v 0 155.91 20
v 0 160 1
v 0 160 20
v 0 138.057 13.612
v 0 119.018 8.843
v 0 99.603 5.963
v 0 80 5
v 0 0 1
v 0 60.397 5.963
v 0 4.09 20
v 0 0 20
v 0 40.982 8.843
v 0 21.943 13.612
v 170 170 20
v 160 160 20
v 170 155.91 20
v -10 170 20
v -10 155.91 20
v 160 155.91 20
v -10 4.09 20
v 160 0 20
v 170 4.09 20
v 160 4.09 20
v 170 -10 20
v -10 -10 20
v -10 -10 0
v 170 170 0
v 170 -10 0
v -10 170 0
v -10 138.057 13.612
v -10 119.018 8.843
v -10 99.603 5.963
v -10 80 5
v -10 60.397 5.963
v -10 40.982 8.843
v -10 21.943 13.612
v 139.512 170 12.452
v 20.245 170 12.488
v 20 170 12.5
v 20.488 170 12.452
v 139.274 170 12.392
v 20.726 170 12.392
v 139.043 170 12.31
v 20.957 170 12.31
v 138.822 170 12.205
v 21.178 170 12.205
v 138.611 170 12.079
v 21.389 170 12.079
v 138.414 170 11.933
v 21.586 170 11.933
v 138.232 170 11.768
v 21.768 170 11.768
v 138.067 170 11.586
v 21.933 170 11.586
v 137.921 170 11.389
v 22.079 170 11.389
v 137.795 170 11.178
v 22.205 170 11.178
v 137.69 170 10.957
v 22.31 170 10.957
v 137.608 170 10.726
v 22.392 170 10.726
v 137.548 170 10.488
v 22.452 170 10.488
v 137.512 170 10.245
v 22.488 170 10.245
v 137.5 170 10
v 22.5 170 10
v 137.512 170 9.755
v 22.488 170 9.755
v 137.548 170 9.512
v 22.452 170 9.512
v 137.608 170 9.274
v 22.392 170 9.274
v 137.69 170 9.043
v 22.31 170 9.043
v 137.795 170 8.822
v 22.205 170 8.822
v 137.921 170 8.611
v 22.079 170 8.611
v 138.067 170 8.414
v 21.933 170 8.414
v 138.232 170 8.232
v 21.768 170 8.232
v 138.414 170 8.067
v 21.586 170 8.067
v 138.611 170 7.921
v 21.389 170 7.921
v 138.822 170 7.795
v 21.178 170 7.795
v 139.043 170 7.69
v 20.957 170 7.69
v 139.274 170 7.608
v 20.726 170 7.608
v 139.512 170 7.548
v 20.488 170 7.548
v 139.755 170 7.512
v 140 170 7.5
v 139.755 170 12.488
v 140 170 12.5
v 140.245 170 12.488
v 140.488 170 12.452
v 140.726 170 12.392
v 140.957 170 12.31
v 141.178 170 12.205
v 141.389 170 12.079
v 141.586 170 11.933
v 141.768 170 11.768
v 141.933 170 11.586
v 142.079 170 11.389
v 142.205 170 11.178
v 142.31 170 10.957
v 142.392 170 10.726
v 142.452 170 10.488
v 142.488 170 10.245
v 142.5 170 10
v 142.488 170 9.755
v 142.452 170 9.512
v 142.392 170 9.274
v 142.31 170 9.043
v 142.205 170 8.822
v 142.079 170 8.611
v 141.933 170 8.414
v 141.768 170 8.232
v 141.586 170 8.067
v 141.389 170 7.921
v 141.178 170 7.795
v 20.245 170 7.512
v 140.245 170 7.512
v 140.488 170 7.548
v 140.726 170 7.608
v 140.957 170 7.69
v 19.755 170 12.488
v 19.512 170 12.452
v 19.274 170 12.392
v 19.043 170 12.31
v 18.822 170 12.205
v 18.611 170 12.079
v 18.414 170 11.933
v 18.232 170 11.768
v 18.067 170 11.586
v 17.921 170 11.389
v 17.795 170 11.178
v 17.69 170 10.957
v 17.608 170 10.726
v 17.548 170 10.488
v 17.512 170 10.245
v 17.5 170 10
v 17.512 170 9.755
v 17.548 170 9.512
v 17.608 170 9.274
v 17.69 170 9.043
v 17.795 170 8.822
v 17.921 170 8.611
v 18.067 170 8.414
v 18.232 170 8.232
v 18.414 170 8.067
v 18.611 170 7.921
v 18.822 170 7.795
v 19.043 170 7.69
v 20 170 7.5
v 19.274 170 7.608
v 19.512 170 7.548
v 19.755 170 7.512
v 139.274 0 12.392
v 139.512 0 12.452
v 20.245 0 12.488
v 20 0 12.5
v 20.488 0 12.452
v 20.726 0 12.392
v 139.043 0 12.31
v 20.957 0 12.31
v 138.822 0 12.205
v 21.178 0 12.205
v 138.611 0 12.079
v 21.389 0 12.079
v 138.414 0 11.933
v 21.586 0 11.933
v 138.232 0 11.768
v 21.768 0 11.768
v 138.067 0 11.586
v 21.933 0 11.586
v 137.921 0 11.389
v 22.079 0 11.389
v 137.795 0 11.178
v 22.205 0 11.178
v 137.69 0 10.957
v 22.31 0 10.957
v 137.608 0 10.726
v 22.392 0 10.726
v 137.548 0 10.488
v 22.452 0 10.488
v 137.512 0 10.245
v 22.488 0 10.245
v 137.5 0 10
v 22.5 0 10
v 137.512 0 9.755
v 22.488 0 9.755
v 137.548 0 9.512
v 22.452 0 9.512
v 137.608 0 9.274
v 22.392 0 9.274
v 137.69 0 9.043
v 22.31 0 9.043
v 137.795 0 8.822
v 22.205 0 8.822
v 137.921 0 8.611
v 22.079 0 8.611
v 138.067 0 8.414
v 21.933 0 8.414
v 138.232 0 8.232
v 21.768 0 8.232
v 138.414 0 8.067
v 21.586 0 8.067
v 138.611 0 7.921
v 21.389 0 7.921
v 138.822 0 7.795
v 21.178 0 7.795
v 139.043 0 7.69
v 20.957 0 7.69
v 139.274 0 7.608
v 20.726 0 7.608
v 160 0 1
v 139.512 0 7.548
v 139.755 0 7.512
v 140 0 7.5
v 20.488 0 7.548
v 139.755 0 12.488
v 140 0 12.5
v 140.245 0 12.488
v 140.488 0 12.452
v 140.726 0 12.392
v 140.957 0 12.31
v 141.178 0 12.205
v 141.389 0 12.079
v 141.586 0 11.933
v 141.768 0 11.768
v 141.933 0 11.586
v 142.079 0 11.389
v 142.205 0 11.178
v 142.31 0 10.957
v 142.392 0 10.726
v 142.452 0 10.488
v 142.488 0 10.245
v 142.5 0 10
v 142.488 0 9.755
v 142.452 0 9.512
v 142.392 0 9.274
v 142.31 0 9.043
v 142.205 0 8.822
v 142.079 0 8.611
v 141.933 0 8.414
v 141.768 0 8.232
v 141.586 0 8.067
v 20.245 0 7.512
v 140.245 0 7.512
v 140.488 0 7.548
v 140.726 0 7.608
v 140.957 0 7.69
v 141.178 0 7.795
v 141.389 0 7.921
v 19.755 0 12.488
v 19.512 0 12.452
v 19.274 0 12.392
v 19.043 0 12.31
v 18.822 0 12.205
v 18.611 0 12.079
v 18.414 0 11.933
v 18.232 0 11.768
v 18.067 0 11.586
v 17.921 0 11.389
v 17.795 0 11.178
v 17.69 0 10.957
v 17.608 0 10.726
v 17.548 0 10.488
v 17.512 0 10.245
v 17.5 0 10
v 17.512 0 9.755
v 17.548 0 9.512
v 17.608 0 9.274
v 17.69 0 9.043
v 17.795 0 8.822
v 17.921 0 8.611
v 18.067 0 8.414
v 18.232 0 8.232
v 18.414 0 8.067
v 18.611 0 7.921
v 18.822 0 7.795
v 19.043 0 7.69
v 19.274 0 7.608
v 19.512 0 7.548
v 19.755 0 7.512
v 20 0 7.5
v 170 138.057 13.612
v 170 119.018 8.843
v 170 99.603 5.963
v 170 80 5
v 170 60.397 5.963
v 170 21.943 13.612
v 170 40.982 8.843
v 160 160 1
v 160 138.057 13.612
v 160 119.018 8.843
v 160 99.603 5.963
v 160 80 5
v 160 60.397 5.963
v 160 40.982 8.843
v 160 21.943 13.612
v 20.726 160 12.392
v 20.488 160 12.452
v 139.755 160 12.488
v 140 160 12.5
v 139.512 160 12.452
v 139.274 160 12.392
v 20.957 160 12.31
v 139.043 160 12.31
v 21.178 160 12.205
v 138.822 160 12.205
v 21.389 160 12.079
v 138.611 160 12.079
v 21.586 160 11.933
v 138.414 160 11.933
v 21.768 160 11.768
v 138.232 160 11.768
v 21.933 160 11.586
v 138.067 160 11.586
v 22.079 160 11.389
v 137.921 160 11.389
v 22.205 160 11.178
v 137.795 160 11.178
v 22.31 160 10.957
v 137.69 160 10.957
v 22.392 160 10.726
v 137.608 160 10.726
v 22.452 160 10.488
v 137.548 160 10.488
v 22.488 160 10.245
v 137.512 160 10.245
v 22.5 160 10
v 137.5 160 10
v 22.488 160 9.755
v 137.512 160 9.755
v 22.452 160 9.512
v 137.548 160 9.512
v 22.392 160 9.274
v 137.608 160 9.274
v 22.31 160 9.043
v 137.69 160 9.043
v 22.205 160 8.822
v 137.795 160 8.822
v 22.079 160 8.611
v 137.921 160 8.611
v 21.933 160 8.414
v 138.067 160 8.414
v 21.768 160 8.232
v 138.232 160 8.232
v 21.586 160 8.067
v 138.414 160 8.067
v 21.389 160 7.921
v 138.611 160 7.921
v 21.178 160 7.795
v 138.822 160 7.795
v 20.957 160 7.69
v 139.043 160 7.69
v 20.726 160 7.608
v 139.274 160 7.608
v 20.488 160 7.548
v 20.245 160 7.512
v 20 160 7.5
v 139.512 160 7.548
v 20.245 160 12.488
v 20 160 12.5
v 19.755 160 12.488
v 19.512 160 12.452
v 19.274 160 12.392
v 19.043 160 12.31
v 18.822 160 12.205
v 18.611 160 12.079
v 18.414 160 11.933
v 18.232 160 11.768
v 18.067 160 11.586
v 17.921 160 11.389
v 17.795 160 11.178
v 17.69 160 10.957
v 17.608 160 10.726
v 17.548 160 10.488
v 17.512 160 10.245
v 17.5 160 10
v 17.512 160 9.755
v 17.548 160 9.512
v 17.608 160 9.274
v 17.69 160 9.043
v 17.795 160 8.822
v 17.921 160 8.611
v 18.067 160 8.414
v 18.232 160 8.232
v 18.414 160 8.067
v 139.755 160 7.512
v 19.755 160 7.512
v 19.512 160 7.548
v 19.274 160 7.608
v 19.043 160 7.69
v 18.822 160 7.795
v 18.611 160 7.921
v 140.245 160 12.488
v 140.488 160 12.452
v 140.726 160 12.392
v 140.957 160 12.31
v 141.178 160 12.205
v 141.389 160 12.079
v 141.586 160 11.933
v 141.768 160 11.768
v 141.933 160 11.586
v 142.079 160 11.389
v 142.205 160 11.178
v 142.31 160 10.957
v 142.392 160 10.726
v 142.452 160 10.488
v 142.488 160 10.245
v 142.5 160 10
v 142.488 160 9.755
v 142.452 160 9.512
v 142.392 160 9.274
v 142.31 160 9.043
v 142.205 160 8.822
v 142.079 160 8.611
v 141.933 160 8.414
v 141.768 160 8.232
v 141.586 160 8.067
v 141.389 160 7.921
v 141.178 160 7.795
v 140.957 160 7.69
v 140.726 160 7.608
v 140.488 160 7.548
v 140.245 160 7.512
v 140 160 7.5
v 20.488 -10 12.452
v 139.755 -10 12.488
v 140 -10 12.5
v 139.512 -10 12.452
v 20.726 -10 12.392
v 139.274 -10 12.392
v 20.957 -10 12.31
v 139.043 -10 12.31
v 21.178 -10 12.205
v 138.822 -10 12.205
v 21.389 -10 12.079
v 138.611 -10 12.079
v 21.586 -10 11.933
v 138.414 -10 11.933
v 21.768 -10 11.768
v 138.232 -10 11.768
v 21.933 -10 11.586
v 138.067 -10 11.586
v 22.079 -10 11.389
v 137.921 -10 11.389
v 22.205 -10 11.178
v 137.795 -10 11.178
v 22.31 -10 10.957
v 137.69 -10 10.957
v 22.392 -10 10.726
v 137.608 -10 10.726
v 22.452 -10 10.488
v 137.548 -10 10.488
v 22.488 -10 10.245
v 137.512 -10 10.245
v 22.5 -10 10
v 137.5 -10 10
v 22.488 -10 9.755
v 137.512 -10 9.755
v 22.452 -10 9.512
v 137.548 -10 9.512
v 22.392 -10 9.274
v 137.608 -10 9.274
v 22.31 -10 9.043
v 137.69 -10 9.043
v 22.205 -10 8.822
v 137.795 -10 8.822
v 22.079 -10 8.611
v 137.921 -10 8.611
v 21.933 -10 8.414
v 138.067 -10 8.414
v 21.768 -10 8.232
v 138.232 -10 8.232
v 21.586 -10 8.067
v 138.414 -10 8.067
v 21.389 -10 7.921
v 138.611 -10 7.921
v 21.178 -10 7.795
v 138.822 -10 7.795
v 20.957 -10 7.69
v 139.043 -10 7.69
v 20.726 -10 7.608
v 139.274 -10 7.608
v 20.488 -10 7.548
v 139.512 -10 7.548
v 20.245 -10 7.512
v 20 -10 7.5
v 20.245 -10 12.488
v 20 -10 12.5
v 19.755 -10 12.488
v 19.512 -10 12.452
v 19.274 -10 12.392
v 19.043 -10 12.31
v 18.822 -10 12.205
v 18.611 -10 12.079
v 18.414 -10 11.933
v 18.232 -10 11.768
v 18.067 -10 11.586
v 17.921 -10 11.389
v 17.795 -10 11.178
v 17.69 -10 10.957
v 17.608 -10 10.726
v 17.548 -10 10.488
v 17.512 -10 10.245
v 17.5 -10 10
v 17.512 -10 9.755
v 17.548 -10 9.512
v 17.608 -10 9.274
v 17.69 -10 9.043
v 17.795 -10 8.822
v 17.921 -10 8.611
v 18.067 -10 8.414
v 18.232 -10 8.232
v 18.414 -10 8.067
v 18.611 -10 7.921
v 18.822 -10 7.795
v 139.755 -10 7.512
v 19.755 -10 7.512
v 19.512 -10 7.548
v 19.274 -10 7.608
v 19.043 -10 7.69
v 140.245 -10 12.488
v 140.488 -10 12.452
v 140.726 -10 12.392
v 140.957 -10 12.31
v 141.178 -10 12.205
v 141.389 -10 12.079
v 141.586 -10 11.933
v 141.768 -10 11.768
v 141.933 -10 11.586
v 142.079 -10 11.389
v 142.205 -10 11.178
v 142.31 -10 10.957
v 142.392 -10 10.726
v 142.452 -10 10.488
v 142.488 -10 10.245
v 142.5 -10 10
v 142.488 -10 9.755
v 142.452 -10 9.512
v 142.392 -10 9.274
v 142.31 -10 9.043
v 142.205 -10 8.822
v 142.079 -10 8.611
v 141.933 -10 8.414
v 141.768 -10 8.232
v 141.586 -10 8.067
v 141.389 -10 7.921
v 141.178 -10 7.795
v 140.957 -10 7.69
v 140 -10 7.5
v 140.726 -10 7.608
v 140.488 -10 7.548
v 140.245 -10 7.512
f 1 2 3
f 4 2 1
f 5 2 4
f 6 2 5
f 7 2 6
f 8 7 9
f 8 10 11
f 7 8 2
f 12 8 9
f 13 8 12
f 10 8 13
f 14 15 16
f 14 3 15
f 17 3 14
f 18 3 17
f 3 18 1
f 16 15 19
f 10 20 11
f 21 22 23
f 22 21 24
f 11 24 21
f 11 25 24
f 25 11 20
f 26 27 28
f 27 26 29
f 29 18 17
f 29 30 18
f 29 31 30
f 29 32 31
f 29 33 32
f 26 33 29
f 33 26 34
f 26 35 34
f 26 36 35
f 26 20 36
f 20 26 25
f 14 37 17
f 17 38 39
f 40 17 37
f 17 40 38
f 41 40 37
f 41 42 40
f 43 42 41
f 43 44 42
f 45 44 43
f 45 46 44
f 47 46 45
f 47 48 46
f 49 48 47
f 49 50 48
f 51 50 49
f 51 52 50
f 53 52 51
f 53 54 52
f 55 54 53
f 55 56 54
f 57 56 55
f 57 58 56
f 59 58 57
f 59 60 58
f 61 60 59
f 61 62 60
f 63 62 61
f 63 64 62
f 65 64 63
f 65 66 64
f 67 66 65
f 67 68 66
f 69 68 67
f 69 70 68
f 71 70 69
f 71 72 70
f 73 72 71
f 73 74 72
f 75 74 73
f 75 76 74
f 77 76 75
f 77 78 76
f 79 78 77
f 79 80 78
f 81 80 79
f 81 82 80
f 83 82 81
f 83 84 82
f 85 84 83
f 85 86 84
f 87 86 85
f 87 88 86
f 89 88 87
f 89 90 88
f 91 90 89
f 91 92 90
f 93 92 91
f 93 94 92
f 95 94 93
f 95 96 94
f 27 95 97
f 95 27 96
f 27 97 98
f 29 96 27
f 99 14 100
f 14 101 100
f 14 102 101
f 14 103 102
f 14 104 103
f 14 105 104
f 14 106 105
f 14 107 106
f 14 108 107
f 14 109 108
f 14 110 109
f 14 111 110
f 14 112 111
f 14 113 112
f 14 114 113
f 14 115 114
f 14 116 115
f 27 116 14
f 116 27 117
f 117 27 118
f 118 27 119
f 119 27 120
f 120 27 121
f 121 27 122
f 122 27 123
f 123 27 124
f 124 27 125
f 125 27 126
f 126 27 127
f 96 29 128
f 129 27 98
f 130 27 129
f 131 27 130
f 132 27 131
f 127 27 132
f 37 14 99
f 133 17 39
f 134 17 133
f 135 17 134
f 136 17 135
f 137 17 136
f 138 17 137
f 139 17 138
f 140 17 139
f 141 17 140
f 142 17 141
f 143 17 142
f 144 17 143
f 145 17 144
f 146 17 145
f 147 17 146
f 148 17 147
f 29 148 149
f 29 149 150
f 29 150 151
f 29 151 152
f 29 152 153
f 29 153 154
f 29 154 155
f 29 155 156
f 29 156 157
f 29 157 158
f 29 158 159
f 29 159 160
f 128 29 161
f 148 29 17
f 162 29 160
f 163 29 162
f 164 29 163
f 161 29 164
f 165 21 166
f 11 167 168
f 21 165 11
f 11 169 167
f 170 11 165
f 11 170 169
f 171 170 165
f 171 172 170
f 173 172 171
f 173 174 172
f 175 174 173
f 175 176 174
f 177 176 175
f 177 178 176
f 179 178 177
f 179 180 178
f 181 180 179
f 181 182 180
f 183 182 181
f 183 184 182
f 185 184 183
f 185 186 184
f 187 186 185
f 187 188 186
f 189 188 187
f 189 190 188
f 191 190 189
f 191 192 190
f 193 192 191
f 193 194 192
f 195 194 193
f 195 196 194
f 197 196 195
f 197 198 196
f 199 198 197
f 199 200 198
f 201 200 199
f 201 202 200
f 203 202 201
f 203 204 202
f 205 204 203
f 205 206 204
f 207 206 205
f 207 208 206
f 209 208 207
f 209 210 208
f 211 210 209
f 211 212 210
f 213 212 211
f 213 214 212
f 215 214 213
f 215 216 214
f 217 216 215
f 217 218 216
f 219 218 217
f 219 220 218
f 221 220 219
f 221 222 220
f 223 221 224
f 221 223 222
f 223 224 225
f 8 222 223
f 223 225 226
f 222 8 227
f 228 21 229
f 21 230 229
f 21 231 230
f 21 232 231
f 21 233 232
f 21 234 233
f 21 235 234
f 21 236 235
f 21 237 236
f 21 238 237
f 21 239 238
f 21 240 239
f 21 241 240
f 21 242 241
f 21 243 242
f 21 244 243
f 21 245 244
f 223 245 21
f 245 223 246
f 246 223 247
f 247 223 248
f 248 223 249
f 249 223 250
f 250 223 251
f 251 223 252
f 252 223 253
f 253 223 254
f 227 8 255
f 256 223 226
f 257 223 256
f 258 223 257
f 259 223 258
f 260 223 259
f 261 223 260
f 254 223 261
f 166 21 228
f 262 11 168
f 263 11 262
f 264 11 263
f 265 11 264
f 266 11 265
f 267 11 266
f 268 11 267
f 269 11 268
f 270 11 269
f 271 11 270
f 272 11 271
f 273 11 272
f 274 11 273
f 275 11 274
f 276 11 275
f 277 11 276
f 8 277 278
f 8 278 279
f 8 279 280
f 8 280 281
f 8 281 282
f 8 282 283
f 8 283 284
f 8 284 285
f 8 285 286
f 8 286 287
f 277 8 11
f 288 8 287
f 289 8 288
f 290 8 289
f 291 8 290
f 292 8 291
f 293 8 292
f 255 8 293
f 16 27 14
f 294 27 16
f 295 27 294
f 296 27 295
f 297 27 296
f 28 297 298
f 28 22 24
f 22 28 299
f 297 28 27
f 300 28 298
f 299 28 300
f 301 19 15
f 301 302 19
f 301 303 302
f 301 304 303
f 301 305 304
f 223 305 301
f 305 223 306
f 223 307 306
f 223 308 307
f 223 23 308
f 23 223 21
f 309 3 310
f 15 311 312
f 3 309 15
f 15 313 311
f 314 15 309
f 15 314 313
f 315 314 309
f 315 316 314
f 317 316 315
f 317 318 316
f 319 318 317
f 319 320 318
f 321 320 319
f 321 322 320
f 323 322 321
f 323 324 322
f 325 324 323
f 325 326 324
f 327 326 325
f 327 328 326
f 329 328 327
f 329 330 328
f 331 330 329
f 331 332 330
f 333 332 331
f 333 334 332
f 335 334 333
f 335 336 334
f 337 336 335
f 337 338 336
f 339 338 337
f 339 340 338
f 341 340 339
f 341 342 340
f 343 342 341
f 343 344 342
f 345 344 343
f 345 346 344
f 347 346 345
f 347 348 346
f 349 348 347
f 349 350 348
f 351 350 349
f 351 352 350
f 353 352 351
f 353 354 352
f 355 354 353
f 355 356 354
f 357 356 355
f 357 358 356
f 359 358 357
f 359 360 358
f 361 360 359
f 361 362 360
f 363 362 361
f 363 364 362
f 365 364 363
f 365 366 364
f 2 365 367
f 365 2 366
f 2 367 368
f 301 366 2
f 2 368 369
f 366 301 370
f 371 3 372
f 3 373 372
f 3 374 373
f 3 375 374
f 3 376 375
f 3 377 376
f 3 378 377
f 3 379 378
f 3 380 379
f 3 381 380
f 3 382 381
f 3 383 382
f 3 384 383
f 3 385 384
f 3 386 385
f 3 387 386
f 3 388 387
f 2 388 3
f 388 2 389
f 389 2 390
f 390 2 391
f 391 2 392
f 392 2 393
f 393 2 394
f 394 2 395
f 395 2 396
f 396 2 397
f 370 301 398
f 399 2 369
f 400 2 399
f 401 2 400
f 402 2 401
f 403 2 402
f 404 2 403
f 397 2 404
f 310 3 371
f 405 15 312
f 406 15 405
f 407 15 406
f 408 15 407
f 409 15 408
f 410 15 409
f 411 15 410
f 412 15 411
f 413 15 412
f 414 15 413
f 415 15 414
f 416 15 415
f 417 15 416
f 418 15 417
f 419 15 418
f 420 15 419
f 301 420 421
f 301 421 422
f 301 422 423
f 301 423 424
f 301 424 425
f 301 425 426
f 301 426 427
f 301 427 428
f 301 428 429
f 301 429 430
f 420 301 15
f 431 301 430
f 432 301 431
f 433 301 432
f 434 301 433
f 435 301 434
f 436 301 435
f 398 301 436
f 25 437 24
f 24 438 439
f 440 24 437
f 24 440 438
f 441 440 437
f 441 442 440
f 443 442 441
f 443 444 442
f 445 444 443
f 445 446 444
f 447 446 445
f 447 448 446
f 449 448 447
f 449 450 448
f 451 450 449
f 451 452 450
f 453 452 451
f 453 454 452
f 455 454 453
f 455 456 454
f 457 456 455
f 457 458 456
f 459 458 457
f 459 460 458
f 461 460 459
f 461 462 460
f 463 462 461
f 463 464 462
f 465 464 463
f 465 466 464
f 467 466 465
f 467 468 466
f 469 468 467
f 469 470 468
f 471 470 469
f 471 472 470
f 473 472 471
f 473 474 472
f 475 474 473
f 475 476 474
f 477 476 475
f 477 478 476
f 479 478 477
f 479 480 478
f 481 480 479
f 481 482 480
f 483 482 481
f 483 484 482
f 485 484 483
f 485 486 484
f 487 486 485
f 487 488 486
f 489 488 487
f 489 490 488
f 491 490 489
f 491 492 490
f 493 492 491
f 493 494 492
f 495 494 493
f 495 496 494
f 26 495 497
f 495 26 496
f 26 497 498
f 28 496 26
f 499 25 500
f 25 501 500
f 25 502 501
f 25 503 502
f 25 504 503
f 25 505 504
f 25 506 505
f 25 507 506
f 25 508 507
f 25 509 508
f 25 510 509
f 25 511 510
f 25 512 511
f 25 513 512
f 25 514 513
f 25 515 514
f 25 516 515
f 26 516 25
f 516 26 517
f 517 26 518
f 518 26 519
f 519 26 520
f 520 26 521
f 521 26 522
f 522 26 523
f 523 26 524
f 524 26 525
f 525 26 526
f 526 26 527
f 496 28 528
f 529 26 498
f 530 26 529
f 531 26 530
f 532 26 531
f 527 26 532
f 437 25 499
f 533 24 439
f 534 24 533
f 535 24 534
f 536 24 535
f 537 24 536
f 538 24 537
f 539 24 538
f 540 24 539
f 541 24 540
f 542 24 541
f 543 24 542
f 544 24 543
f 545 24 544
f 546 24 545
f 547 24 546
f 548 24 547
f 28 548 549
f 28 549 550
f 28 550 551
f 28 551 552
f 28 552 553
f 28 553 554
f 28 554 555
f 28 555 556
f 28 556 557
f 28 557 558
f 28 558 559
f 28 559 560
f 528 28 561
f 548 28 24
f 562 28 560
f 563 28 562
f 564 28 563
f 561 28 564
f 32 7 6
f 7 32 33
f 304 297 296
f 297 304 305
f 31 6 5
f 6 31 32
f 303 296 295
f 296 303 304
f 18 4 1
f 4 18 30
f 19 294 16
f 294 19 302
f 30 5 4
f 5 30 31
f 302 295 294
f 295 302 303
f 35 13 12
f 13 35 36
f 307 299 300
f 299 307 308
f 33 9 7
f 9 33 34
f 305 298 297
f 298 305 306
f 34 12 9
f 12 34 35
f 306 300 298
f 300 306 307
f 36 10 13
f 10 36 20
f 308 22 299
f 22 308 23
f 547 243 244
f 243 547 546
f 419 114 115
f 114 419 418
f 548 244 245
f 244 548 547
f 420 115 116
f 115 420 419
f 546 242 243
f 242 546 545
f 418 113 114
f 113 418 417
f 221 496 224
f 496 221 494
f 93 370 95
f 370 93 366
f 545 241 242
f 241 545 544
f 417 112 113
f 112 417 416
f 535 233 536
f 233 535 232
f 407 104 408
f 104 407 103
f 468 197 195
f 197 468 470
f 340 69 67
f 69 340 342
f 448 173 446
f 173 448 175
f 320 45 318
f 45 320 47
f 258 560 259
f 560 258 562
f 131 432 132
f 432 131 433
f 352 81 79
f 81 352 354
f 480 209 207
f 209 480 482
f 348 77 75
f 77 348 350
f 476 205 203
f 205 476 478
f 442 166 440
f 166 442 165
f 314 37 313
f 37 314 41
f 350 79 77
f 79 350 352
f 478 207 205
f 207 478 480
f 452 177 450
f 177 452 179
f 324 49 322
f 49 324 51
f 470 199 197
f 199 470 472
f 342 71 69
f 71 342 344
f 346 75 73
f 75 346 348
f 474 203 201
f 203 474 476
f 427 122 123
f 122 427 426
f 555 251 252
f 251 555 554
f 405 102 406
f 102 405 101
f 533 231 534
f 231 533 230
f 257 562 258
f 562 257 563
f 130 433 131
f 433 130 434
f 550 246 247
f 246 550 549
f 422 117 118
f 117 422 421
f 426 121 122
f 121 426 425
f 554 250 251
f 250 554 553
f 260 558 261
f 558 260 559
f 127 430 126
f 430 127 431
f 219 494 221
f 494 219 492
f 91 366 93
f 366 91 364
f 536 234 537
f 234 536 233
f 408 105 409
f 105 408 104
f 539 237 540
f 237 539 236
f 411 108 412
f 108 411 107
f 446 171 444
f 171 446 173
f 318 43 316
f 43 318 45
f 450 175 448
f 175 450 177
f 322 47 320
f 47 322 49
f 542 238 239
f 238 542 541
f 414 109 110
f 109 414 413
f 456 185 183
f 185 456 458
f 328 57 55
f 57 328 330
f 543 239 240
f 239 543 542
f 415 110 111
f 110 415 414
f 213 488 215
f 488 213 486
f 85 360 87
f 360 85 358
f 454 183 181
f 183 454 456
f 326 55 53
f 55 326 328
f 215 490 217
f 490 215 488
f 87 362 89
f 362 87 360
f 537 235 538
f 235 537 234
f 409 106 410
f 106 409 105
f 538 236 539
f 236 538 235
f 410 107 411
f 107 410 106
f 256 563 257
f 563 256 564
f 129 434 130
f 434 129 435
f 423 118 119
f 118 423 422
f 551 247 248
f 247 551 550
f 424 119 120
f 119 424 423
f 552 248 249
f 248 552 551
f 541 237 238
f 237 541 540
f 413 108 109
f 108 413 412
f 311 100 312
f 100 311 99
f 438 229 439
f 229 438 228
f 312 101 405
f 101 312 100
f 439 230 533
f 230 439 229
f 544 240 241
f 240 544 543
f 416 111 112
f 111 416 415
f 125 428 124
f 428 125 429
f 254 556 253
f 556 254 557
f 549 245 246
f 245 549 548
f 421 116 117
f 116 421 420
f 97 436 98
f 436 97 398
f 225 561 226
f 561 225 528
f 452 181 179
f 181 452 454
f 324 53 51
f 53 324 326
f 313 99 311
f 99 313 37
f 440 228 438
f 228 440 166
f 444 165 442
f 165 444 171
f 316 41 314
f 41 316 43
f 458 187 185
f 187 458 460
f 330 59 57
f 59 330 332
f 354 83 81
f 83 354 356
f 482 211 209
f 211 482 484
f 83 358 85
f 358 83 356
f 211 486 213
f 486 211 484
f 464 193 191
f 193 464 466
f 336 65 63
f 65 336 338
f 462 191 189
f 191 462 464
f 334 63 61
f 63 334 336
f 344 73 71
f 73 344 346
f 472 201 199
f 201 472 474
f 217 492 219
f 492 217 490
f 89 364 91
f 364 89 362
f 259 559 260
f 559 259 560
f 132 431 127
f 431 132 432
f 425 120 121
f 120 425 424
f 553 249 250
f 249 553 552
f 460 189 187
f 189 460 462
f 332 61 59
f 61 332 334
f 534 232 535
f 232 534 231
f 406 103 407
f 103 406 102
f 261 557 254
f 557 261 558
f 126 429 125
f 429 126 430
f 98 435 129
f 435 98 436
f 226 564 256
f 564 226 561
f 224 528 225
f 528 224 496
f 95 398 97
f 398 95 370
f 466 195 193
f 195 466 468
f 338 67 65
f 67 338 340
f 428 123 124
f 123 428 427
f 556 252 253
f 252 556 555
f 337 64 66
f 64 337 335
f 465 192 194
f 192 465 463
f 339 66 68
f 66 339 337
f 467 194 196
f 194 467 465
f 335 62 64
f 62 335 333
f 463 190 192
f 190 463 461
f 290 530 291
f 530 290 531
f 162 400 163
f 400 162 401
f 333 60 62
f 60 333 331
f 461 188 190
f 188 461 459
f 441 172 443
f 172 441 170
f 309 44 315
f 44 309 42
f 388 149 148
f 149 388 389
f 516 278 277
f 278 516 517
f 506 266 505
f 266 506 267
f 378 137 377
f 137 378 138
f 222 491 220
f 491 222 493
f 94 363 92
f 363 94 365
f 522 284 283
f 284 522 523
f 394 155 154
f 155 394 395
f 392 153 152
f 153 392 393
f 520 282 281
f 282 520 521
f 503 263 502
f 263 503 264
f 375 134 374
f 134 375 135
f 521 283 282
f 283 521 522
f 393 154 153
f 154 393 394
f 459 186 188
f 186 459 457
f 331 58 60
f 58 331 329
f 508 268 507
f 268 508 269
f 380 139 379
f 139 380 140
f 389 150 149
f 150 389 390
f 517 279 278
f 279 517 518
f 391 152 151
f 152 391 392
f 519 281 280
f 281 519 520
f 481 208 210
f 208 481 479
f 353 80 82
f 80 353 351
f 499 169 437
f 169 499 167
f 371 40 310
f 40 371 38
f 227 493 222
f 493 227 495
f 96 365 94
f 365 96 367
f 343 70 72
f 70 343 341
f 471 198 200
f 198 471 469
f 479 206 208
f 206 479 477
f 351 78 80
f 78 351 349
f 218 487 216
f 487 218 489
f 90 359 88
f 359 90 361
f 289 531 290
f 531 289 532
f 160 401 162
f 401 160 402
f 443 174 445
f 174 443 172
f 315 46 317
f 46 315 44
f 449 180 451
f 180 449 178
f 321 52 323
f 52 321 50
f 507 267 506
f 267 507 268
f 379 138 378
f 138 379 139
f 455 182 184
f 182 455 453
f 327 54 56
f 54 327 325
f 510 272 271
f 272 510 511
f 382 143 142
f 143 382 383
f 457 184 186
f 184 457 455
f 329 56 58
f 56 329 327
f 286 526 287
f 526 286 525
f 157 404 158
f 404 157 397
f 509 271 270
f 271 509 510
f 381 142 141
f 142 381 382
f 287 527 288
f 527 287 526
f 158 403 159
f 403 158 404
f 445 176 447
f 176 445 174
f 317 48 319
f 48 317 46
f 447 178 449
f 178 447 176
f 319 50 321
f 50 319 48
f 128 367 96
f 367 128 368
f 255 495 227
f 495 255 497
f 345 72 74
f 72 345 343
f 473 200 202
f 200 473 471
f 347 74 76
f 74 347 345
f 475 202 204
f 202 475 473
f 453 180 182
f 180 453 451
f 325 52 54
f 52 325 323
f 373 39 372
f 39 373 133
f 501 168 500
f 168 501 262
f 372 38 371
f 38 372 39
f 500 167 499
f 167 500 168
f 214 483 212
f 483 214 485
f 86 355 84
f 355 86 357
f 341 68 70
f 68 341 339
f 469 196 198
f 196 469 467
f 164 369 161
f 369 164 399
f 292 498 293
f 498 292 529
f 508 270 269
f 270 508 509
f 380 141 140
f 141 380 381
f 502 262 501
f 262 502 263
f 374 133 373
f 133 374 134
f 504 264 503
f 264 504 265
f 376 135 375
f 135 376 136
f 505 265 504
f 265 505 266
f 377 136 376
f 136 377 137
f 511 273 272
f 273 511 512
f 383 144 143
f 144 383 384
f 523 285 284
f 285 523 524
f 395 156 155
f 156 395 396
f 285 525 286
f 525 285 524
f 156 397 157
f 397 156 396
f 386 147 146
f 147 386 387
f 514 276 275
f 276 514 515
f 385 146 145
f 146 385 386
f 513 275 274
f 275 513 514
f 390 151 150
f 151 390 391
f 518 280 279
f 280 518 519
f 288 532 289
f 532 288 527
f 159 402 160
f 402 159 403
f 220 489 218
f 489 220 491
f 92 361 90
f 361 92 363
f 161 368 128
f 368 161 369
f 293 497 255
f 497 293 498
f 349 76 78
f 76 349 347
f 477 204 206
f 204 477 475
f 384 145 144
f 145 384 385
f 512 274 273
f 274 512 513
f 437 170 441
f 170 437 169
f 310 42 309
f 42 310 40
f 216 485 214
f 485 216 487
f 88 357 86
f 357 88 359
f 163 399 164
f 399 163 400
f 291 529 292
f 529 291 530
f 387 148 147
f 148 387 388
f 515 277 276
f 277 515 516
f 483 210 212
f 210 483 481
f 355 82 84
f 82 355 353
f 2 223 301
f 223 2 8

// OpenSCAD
$fn=64;

SIZE_X = 160;
SIZE_Y = 160;

GAP = 5;

BORDER_W = 10;
BORDER_H = 20;

// for ( i = [0 : GAP : SIZE_X] ){
//     translate([i, 0, 0])
//         cube(size = [1, SIZE_Y, 2]);
// }

// for ( i = [0 : GAP : SIZE_Y] ){
//     translate([0, i, 0])
//         cube(size = [SIZE_X, 1, 2]);
// }

cube(size = [SIZE_X, SIZE_Y, 1]);

difference() {
  border();


    translate([-500, SIZE_Y / 2, 205]) 
        rotate([0, 90, 0]) 
            cylinder(h = 1000, r = 200);

    translate([SIZE_X - 20, 500, 10]) 
        rotate([90, 0, 0]) 
            cylinder(h = 1000, r = 2.5);

    translate([20, 500, 10]) 
        rotate([90, 0, 0]) 
            cylinder(h = 1000, r = 2.5);
}





module border() {
    translate([-BORDER_W, 0, 0])
        cube(size = [BORDER_W, SIZE_Y + BORDER_W, BORDER_H]);

    translate([SIZE_X, 0, 0])
        cube(size = [BORDER_W, SIZE_Y + BORDER_W, BORDER_H]);

    translate([0, SIZE_Y, 0])
        cube(size = [SIZE_X + BORDER_W, BORDER_W, BORDER_H]);

    translate([-BORDER_W, -BORDER_W, 0])
        cube(size = [SIZE_X + BORDER_W * 2, BORDER_W, BORDER_H]);
}
